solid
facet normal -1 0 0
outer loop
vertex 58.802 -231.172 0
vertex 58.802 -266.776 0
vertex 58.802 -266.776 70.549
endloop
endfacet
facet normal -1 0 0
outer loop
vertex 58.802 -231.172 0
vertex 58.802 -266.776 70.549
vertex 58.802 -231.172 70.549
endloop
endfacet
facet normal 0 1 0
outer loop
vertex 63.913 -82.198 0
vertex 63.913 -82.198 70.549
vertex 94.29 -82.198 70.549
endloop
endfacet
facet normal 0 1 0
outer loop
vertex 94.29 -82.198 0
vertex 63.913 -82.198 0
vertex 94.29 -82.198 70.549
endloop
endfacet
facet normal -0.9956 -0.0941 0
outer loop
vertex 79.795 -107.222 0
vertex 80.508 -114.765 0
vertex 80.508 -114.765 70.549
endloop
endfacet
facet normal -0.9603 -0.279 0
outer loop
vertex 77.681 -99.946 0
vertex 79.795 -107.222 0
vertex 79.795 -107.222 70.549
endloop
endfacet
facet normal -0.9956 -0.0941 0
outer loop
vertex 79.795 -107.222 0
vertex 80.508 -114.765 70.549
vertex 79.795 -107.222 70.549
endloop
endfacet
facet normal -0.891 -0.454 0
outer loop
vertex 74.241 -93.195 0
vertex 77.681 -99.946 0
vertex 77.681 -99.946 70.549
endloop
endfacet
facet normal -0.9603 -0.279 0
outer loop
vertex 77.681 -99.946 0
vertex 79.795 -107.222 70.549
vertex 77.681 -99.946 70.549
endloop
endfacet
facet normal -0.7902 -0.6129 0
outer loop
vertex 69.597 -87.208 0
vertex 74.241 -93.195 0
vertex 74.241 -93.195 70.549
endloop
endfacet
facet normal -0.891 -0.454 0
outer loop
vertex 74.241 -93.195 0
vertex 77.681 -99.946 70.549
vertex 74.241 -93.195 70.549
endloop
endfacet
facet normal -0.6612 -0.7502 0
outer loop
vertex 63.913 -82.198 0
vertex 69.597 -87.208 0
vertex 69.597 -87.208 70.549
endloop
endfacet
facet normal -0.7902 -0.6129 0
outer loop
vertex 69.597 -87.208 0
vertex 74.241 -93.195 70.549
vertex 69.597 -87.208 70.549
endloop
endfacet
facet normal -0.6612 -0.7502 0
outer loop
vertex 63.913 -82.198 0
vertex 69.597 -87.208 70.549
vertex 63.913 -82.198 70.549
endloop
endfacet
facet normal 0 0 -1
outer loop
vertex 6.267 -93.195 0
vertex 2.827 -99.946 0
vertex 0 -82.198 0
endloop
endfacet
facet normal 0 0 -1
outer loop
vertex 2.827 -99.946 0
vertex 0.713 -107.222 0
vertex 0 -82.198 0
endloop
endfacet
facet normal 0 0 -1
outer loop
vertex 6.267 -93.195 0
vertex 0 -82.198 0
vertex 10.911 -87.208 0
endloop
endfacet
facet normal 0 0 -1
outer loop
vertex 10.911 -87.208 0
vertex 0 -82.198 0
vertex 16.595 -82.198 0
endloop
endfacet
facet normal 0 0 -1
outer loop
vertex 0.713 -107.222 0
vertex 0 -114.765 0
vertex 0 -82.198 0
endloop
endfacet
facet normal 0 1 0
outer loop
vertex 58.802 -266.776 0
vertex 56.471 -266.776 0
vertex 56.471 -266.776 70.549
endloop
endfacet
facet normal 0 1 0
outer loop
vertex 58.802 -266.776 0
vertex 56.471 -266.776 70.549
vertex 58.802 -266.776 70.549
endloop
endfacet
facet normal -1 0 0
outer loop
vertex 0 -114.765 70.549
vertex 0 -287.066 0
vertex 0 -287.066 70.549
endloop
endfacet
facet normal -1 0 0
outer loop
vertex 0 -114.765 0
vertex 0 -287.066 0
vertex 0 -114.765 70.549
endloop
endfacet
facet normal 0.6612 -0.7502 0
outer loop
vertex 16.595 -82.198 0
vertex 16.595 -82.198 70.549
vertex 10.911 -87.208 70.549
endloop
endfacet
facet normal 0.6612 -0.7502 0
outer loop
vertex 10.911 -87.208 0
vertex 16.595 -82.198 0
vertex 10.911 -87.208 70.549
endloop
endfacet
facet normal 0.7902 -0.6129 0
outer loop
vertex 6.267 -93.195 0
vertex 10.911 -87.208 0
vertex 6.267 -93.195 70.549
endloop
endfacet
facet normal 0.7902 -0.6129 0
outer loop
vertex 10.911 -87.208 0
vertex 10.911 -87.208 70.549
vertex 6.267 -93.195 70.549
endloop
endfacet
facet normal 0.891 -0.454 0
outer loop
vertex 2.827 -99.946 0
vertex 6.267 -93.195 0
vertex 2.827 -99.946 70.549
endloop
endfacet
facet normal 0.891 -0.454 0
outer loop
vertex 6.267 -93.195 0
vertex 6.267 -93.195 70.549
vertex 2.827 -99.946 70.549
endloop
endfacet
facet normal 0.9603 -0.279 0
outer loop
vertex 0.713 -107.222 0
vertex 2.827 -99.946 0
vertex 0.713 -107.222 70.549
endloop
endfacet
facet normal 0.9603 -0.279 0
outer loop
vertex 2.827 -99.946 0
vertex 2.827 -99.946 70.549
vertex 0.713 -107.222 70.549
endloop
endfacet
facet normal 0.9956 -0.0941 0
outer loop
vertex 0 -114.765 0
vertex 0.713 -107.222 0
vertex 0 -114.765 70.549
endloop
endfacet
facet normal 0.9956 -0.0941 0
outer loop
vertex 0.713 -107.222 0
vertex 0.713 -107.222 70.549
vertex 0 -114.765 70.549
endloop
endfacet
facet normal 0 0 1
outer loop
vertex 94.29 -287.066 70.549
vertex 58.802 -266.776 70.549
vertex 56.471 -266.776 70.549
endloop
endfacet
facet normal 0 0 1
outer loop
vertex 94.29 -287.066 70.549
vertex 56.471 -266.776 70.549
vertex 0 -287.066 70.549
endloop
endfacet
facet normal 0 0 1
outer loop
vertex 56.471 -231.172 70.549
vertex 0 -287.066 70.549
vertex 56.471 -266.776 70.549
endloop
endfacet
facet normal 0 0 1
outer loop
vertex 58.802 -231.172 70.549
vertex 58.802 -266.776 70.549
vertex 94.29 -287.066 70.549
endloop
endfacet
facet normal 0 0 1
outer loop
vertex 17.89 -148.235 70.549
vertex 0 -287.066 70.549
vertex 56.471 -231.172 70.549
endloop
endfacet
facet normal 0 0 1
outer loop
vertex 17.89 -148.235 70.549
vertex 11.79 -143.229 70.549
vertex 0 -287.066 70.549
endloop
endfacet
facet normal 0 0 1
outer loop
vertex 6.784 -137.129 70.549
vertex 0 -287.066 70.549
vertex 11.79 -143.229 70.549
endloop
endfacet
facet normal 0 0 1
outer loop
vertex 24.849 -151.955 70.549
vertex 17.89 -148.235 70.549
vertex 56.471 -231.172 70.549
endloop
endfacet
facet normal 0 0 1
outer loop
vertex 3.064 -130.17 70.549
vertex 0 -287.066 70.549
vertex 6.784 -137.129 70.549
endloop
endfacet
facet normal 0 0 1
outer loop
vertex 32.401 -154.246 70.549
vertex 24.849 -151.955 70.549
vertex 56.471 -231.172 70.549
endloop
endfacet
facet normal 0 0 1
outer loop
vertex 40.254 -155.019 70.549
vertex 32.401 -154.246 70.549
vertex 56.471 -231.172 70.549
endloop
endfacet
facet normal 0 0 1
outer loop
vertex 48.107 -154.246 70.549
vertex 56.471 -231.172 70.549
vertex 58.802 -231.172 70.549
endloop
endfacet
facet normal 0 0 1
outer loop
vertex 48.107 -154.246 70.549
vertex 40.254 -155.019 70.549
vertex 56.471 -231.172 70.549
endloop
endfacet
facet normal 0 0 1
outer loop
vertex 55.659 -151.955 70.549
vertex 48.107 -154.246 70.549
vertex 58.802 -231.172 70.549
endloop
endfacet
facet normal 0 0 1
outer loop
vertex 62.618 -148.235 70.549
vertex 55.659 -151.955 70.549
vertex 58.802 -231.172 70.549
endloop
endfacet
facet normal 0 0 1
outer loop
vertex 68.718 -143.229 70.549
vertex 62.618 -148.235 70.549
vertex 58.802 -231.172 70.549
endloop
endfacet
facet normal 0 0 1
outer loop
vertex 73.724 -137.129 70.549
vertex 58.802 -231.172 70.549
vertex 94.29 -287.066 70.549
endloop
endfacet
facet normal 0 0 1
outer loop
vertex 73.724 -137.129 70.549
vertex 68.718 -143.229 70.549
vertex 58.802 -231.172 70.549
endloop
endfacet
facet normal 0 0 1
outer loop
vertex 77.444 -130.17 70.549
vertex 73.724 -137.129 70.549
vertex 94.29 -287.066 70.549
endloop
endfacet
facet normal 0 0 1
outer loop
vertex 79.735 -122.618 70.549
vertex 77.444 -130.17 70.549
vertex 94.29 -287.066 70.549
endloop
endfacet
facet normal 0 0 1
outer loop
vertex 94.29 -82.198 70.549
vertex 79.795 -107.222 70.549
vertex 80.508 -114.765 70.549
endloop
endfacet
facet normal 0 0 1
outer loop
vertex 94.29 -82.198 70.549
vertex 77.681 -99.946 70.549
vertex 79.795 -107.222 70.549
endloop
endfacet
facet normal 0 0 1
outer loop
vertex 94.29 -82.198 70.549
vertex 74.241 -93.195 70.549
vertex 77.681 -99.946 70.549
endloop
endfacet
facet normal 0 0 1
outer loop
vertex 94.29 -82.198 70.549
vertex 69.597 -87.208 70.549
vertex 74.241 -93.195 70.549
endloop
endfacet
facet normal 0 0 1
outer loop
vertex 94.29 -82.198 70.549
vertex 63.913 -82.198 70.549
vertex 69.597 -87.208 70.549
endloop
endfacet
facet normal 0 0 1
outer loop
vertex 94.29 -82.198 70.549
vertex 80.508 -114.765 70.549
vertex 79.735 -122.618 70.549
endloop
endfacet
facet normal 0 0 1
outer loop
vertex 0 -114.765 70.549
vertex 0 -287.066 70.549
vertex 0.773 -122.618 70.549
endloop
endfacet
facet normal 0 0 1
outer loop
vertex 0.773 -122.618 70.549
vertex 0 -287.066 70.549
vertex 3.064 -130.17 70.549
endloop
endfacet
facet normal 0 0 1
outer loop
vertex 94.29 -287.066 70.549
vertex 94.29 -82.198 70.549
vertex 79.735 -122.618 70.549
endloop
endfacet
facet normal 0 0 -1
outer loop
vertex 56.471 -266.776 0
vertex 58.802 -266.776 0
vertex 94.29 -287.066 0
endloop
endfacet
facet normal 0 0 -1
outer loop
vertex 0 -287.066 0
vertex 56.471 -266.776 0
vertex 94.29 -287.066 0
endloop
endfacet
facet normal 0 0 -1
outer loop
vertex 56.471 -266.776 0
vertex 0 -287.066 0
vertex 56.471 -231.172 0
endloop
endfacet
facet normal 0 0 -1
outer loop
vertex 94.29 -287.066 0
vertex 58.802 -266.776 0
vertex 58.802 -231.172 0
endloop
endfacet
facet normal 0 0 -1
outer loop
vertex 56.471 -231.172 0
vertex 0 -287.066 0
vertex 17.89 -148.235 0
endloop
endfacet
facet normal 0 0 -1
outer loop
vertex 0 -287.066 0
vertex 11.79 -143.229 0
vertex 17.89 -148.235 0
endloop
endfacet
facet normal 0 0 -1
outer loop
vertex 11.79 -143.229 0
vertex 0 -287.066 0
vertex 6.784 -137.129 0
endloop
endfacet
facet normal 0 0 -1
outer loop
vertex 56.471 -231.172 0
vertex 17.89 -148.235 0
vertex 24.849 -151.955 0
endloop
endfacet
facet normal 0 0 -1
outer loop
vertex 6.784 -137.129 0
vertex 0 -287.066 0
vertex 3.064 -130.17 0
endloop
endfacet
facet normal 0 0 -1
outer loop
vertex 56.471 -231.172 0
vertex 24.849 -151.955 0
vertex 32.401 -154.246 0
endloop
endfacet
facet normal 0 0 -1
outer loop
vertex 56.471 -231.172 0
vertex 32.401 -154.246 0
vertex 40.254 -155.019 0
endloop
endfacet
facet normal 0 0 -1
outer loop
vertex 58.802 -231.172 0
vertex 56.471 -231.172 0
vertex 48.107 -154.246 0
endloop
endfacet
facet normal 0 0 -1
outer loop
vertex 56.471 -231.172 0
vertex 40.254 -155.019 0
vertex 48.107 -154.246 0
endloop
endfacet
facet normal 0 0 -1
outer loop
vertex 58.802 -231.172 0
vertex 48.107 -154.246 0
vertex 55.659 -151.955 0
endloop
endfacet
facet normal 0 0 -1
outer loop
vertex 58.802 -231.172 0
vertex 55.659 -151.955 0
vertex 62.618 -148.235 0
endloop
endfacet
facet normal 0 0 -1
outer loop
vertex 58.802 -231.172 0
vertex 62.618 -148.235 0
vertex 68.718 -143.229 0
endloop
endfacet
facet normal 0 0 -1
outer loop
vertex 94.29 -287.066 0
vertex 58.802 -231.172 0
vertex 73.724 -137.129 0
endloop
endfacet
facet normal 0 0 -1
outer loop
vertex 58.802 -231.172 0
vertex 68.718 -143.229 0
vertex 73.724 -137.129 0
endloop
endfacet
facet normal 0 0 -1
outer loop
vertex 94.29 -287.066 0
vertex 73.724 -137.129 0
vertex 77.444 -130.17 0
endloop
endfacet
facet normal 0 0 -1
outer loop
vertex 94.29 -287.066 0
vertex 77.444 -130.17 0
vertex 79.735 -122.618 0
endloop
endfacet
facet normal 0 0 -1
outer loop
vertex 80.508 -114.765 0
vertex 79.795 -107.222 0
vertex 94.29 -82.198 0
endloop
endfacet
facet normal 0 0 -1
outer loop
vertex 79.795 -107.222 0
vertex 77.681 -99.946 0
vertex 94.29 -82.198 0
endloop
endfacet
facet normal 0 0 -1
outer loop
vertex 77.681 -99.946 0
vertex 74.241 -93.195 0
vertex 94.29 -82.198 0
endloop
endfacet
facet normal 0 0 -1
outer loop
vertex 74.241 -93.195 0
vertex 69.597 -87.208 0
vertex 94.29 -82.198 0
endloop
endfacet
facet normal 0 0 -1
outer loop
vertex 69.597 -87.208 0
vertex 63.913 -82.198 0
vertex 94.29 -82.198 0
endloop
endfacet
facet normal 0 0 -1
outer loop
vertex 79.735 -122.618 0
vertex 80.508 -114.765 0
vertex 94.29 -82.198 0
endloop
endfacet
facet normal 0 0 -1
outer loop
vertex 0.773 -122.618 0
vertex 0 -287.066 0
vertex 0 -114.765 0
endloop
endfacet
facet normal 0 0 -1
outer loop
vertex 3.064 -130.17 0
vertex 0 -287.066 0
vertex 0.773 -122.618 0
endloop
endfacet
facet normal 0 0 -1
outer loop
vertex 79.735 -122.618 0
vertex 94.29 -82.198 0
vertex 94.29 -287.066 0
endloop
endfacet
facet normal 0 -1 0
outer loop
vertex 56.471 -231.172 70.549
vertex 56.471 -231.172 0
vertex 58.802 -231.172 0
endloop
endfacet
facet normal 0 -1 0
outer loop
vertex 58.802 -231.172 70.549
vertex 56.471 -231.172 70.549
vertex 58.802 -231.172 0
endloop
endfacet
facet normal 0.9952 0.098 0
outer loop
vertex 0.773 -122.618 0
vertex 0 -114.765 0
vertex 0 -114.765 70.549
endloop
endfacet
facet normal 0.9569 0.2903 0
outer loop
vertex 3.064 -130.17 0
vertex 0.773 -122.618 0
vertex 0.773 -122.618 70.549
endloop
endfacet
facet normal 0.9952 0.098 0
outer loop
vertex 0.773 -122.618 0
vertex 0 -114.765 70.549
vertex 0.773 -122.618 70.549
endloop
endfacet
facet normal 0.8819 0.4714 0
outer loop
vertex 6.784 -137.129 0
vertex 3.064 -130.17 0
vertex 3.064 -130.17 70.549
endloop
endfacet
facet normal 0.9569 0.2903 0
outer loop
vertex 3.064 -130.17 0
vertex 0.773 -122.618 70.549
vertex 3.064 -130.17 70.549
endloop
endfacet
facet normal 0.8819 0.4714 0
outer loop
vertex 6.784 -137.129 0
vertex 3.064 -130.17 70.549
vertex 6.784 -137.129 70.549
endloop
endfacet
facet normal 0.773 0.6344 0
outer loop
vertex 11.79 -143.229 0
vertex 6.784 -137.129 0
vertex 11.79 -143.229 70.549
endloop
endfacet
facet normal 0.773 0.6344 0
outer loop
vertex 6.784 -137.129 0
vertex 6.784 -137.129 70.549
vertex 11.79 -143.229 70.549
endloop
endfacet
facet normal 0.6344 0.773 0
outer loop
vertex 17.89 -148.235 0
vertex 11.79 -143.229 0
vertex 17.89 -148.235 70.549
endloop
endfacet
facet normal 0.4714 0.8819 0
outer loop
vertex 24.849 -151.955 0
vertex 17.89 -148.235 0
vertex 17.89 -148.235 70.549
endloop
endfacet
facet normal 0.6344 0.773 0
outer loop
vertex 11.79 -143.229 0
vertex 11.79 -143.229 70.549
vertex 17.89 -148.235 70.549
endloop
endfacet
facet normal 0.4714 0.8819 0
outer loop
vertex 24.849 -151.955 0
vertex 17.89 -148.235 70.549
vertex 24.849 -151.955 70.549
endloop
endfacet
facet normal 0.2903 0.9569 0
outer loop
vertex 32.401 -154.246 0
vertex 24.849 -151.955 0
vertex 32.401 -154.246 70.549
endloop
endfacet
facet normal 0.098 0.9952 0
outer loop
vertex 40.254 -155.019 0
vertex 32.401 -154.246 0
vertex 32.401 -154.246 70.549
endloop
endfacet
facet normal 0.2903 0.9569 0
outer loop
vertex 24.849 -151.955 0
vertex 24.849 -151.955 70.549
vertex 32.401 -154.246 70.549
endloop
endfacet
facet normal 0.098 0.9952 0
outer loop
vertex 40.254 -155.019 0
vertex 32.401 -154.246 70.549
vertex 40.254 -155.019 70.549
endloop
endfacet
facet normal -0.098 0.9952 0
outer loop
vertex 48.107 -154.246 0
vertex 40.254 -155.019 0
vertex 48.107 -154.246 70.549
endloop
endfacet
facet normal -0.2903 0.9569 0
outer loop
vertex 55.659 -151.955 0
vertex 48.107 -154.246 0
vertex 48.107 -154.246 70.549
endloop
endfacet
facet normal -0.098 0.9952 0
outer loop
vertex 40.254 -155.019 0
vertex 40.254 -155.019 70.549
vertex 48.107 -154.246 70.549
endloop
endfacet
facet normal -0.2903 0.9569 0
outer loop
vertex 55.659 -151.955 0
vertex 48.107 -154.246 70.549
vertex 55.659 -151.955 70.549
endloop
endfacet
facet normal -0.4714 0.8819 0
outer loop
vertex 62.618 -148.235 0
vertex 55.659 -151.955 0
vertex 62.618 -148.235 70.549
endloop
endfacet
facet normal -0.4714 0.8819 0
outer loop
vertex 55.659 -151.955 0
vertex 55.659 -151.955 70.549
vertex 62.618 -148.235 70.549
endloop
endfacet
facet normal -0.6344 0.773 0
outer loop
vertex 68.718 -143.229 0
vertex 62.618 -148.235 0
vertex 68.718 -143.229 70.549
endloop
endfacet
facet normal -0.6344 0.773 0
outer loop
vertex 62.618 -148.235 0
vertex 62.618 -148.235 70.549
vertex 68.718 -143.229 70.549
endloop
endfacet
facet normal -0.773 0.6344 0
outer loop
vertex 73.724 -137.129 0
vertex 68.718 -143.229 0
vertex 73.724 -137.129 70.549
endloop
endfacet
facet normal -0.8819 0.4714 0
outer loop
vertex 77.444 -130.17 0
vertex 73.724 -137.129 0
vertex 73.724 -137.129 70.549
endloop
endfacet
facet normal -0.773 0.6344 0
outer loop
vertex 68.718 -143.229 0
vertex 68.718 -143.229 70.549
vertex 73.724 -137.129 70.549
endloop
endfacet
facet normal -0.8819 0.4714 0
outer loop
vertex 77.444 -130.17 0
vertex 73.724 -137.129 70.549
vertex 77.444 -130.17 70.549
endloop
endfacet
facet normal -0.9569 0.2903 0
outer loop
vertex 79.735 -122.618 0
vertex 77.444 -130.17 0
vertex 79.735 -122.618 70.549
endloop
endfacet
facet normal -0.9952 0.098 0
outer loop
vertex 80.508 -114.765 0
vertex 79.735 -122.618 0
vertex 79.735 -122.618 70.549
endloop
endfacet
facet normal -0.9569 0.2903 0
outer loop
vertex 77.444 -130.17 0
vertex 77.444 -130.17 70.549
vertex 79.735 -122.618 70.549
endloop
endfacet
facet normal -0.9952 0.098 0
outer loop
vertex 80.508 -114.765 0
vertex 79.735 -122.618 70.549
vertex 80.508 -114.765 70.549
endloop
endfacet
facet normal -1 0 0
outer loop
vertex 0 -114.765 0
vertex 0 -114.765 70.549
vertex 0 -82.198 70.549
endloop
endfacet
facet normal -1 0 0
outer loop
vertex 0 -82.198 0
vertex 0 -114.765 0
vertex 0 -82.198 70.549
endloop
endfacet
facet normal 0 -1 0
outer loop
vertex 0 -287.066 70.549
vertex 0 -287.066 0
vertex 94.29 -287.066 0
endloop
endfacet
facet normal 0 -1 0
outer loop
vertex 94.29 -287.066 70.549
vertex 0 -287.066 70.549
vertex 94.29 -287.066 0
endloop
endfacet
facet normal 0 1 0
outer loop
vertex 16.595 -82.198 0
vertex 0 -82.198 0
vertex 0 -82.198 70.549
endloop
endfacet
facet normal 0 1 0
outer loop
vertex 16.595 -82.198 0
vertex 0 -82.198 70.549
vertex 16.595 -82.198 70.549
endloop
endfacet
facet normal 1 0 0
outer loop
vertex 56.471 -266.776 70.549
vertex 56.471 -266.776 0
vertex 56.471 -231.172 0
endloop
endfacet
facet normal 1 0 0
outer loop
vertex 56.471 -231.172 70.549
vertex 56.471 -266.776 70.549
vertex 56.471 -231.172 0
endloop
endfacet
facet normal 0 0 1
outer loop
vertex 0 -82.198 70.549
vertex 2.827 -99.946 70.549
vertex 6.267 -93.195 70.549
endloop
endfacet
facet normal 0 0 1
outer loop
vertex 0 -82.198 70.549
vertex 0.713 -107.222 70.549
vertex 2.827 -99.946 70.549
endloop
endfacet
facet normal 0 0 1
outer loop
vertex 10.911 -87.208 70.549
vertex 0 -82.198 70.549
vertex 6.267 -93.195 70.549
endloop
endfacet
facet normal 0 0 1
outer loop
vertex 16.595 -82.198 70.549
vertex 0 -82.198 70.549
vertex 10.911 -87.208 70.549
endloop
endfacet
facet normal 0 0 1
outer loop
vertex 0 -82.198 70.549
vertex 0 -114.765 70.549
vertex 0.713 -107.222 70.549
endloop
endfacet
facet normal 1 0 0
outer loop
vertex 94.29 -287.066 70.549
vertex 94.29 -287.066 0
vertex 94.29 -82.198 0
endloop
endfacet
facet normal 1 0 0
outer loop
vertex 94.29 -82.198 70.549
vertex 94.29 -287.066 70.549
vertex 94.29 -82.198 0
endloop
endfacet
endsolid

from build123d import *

# Parameters (mm, degrees)
F0_W     = 94.289586
F0_H     = 204.868033
F0_W_2   = 2.331507
F0_H_2   = 35.604
F1_DEPTH = 70.548587
F3_DEPTH = 90.976335


with BuildPart() as f1:
    # F0 (on Top) → F1 (new body)
    with BuildSketch(Plane.XY):
        with Locations((47.144793, -184.631728)):
            Rectangle(F0_W, F0_H)
        with Locations((57.636564, -248.973668)):
            Rectangle(F0_W_2, F0_H_2, mode=Mode.SUBTRACT)
    extrude(amount=F1_DEPTH)

    # F2 (on face) → F3 (cut)
    with BuildSketch(Plane.XY.offset(70.548587)):
        with BuildLine():
            ThreePointArc((0, -114.765167), (40.254056, -155.019224), (80.508113, -114.765167))
            ThreePointArc((80.508113, -114.765167), (76.120204, -96.489268), (63.91309, -82.197711))
            Line((63.91309, -82.197711), (16.595023, -82.197711))
            ThreePointArc((16.595023, -82.197711), (4.387909, -96.489268), (0, -114.765167))
        make_face()
    extrude(amount=-F3_DEPTH, mode=Mode.SUBTRACT)


solid = f1.part
